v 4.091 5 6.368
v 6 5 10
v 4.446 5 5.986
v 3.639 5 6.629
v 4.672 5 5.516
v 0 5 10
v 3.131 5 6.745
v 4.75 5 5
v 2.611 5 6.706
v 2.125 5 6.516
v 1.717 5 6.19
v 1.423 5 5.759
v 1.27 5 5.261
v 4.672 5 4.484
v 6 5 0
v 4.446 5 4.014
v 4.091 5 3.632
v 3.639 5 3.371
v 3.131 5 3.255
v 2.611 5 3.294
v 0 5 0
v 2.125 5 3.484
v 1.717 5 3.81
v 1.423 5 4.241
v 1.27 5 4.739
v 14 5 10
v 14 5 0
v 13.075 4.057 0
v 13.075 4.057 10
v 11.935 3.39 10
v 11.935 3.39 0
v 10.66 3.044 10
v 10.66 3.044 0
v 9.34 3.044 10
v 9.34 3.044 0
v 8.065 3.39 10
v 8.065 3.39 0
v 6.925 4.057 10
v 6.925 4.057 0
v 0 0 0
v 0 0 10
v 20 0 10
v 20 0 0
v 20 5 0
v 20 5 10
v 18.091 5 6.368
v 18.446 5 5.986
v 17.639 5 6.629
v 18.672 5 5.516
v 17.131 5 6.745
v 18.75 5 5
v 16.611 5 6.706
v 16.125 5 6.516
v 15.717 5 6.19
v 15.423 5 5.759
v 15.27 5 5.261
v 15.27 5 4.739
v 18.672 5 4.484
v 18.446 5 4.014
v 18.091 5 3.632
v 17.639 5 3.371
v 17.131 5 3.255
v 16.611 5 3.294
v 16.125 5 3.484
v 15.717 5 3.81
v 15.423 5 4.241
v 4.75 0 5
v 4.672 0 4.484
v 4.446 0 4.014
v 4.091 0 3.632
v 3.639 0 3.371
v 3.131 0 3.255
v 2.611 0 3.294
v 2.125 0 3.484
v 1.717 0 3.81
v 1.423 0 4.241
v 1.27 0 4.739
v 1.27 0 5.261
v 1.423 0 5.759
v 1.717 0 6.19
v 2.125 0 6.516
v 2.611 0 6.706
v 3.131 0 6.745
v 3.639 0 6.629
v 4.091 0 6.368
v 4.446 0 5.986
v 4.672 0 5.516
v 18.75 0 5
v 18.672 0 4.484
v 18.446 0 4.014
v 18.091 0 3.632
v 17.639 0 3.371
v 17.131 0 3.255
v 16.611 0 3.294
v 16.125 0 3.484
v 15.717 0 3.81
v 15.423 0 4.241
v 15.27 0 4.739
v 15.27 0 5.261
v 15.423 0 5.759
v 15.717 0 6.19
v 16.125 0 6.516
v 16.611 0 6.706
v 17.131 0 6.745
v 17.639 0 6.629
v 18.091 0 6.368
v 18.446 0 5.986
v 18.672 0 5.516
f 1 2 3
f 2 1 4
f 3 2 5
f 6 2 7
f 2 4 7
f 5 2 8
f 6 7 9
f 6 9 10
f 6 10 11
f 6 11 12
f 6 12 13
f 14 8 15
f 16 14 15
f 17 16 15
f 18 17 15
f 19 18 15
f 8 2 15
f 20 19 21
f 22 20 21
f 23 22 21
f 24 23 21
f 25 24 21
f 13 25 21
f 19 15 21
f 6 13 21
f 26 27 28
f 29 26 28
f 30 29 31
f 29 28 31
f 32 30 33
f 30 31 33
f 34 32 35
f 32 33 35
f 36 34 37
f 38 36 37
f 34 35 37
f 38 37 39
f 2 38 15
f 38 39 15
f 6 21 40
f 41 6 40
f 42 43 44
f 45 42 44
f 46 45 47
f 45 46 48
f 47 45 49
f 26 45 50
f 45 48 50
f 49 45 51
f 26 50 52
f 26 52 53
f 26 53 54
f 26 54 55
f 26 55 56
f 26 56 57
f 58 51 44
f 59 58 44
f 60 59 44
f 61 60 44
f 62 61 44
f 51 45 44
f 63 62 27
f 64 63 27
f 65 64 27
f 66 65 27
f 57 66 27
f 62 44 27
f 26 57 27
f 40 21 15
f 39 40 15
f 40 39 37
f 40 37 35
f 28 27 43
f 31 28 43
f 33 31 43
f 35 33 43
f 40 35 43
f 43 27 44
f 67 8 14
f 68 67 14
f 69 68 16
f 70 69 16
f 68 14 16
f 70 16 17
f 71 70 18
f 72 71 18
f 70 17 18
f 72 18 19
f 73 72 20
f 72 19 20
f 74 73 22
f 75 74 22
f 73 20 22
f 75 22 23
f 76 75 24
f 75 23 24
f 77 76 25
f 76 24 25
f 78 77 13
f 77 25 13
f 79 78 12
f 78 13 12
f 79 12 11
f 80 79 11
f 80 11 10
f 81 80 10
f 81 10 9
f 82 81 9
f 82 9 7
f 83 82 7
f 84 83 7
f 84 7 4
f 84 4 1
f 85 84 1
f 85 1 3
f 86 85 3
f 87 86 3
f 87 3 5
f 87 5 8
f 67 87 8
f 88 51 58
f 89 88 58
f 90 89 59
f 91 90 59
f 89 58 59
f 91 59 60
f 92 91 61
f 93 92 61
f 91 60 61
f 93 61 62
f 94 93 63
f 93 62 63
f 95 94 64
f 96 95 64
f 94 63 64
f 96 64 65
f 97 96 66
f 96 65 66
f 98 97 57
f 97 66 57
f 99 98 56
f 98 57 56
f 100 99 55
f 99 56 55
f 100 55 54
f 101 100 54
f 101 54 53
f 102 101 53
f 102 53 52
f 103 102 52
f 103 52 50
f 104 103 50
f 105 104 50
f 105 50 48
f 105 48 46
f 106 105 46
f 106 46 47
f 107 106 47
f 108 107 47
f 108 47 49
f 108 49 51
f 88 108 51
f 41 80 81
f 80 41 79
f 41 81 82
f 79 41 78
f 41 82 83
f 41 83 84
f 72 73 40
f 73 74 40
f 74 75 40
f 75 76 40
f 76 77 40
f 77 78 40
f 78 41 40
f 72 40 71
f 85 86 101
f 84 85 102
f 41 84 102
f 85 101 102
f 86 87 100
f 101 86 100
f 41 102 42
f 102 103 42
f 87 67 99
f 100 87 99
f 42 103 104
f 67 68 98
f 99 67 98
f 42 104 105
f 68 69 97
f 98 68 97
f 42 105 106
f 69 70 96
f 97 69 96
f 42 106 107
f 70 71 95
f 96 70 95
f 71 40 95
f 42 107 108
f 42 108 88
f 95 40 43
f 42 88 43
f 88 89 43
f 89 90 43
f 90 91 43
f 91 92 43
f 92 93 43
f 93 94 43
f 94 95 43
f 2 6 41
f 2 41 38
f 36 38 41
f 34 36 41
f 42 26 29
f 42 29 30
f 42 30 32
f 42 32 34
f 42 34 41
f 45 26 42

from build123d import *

# Parameters (mm, degrees)
AUFSATZ_LINEAR_AUSTRAGEN1_DEPTH = 10
SKIZZE2_R                       = 1.75
SCHNITT_LINEAR_AUSTRAGEN1_DEPTH = 6


with BuildPart() as part:
    # Skizze1 → Aufsatz-Linear austragen1 (new body)
    with BuildSketch(Plane.XY):
        with BuildLine():
            Line((0, 0), (20, 0))
            Line((20, 0), (20, 5))
            Line((20, 5), (14, 5))
            ThreePointArc((14, 5), (10, 3), (6, 5))
            Line((6, 5), (0, 5))
            Line((0, 5), (0, 0))
        make_face()
    extrude(amount=AUFSATZ_LINEAR_AUSTRAGEN1_DEPTH)

    # Skizze2 → Schnitt-Linear austragen1 (cut, through all)
    with BuildSketch(Plane(origin=(0, 5, 0), x_dir=(1, 0, 0), z_dir=(0, 1, 0))):
        with Locations((3, -5)):
            Circle(SKIZZE2_R)
        with Locations((17, -5)):
            Circle(SKIZZE2_R)
    extrude(amount=-SCHNITT_LINEAR_AUSTRAGEN1_DEPTH, mode=Mode.SUBTRACT)


solid = part.part
